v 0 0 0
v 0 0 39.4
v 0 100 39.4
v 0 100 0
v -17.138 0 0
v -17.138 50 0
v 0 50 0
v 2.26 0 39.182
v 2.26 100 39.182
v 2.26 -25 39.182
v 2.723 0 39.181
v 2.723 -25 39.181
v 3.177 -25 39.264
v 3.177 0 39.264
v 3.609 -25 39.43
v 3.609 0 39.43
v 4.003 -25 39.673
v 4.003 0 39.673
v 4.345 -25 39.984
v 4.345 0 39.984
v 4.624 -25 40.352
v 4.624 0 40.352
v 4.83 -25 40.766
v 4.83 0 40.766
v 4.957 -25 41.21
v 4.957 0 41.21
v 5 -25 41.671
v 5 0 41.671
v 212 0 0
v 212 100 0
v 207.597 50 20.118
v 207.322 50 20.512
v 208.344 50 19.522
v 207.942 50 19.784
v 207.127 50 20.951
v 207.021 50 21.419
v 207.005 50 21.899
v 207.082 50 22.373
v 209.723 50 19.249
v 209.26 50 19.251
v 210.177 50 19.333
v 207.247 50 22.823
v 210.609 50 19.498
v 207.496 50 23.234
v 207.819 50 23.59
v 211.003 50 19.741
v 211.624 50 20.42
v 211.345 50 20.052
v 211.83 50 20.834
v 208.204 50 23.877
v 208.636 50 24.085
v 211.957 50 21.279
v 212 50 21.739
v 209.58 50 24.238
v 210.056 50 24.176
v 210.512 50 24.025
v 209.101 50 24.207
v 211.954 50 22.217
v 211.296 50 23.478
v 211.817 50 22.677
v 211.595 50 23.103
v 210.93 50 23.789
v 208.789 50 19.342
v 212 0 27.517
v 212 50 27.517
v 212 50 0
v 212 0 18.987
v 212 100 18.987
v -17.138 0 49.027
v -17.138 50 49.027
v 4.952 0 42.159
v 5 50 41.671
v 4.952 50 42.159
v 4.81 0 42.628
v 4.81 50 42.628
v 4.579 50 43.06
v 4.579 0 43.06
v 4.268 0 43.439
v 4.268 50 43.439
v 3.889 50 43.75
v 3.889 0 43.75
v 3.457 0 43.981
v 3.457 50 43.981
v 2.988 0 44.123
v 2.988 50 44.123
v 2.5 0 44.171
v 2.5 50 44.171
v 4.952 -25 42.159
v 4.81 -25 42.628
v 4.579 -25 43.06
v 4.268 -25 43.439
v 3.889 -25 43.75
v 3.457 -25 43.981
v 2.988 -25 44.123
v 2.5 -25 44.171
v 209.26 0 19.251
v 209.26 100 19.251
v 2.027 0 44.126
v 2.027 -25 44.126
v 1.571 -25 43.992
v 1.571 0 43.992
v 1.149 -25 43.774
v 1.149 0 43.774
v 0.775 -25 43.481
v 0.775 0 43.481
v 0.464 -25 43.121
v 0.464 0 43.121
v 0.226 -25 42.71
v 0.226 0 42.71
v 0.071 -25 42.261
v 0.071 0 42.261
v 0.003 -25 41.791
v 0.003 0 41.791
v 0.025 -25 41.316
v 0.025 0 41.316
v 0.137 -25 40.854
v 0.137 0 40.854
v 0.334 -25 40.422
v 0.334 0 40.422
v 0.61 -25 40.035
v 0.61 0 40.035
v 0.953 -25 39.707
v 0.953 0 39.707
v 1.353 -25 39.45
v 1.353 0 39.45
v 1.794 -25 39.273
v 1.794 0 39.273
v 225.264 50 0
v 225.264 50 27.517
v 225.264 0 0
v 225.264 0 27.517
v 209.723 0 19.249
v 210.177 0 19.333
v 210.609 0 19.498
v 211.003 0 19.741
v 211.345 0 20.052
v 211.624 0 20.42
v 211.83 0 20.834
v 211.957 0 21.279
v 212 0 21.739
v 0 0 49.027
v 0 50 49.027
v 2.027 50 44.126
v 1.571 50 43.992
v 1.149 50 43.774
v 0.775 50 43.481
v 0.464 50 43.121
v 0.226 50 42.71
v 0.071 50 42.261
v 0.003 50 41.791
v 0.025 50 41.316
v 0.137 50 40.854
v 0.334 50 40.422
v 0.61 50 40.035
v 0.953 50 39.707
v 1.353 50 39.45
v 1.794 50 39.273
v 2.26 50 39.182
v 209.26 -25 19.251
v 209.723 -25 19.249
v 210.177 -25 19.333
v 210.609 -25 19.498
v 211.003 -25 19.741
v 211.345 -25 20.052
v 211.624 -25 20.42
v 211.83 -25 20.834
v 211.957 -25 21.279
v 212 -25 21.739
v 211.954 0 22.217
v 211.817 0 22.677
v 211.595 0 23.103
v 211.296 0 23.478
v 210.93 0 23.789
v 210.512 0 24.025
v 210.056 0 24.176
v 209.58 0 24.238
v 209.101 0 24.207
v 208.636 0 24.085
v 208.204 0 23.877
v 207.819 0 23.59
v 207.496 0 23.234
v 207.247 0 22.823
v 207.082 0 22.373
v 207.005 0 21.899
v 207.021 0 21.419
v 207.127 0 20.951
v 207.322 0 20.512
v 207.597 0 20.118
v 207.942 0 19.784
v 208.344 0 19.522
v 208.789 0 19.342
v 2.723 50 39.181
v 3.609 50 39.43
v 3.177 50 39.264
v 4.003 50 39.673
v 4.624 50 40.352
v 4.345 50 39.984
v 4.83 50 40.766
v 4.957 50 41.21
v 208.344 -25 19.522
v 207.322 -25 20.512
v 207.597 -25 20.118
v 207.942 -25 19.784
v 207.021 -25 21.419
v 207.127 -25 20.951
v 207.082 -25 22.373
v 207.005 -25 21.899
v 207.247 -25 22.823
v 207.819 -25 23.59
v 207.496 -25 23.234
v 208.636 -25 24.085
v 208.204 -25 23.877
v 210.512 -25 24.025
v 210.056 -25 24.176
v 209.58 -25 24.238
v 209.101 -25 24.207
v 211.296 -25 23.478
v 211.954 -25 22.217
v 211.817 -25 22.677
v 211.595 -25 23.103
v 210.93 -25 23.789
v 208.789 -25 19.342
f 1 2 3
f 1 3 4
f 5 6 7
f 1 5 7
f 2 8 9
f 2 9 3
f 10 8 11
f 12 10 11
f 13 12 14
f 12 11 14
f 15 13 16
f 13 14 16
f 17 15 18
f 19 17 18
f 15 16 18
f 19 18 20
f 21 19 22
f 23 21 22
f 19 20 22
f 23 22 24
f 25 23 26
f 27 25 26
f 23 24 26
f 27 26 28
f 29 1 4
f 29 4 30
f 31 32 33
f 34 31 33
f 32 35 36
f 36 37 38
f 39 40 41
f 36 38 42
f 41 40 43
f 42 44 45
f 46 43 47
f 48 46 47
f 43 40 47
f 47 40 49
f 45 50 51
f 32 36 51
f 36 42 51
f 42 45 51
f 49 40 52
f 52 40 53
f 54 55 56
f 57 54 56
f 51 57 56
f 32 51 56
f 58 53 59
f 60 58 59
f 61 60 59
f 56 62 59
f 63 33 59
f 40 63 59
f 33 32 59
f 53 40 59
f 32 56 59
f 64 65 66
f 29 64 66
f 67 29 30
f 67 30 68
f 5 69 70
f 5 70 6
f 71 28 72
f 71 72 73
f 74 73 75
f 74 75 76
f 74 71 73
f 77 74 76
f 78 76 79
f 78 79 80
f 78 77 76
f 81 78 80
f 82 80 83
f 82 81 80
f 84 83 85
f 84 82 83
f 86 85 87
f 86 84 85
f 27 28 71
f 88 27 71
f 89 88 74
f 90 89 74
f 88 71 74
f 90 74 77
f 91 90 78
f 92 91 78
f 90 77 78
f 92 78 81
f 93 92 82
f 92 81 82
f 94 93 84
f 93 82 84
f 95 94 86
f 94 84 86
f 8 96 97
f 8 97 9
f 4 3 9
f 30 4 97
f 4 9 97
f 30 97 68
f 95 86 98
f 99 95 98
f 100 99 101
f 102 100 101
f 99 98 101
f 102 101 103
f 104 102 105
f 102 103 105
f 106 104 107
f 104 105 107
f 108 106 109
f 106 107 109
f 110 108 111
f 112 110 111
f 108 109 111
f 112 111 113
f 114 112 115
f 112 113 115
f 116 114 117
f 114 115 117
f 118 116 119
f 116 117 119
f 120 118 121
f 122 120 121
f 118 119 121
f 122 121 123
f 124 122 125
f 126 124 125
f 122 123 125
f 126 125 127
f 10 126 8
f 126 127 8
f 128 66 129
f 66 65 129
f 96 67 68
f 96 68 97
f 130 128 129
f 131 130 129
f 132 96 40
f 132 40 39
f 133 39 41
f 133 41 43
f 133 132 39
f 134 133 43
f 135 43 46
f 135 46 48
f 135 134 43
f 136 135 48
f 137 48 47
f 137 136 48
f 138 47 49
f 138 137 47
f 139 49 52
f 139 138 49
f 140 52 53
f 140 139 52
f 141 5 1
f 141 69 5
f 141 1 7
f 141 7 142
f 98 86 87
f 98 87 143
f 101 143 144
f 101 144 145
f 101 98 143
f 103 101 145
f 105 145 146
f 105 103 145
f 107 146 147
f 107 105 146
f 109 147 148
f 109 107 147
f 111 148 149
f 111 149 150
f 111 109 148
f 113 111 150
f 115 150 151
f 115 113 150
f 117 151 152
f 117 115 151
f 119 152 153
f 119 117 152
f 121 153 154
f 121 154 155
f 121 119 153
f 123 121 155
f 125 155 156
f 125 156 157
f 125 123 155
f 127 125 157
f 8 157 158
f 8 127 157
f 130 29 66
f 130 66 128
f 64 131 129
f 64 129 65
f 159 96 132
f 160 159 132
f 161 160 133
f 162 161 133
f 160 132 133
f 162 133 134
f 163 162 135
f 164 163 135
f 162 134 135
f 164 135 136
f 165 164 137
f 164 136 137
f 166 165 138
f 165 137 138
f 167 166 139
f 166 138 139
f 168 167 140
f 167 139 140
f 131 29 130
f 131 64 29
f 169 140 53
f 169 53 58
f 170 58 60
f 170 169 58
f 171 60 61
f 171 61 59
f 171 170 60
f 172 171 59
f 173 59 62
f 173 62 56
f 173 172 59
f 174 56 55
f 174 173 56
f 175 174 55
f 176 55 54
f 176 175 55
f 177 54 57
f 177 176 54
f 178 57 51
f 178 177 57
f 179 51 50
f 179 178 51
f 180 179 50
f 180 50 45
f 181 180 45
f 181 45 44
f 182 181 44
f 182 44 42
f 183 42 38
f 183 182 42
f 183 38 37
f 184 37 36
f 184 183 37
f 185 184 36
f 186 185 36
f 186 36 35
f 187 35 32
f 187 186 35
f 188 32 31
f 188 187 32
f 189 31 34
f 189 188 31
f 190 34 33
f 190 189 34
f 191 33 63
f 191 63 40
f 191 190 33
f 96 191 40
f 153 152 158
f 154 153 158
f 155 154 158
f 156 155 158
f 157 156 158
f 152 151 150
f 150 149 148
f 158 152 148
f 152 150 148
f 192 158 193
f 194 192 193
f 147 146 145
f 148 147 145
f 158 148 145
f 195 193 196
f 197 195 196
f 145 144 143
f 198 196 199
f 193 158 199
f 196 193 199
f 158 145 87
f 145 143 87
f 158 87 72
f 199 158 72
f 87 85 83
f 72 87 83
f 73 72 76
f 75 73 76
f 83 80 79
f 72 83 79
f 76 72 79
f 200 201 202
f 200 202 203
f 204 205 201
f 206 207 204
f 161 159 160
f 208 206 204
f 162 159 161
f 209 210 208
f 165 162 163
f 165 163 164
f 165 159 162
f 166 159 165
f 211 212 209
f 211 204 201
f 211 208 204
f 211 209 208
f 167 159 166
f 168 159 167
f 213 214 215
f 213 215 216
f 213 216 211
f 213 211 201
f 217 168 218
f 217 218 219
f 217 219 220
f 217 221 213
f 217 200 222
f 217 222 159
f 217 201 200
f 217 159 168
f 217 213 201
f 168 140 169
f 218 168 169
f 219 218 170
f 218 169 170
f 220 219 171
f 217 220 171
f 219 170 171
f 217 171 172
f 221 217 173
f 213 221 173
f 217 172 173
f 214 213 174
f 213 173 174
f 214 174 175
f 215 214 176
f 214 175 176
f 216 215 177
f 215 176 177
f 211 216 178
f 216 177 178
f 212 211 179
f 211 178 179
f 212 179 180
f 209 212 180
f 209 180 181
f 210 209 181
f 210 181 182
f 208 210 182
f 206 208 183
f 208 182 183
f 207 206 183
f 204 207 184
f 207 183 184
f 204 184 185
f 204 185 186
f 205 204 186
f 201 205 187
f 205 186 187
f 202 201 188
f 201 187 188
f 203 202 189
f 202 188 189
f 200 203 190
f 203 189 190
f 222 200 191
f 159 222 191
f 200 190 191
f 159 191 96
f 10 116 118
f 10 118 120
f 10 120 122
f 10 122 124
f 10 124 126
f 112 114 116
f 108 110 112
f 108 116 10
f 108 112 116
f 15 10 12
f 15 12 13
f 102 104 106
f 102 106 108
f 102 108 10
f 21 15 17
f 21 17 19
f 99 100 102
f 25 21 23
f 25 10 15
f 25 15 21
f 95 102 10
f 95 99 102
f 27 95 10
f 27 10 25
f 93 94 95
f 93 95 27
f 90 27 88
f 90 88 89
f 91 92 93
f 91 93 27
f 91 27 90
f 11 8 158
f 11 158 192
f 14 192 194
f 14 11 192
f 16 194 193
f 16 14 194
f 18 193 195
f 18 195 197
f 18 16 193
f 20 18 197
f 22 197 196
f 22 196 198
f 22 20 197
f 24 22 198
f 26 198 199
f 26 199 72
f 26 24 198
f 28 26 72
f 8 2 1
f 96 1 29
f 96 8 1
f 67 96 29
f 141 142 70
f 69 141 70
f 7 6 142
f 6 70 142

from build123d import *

# Parameters (mm, degrees)
F1_DEPTH      = 100
F2_DEPTH      = 25
F2_DEPTH_BACK = 50
F4_DEPTH      = 50


with BuildPart() as f1:
    # F0 (on Front) → F1 (new body)
    with BuildSketch(Plane.XZ):
        Polygon((0, 39.4), (0, 0), (212, 0), (212, 18.9867217821), (209.2603855849, 19.2505166466), (2.2603855436, 39.1823496275), align=None)
    extrude(amount=-F1_DEPTH)


with BuildPart() as f2:
    # F0 (on Front) → F2 (new body, two sides)
    with BuildSketch(Plane.XZ) as f2_sk:
        with BuildLine():
            ThreePointArc((2.5, 44.1708401161), (0.0028790356, 41.7907854751), (2.2603855436, 39.1823496275))
            ThreePointArc((2.2603855436, 39.1823496275), (4.1809169907, 39.820294772), (5, 41.6708401161))
            ThreePointArc((5, 41.6708401161), (4.267766953, 43.4386070691), (2.5, 44.1708401161))
        make_face()
    extrude(amount=F2_DEPTH)
    extrude(f2_sk.sketch, amount=-F2_DEPTH_BACK)


with BuildPart() as f2b:
    # F0 (on Front) → F2, piece 2 (new body, two sides)
    with BuildSketch(Plane.XZ) as f2_2_sk:
        with BuildLine():
            ThreePointArc((212, 21.7390071392), (207.819082994, 23.5895524694), (209.2603855849, 19.2505166466))
            ThreePointArc((209.2603855849, 19.2505166466), (211.180917006, 19.8884618091), (212, 21.7390071392))
        make_face()
    extrude(amount=F2_DEPTH)
    extrude(f2_2_sk.sketch, amount=-F2_DEPTH_BACK)


with BuildPart() as f4:
    # F3 (on face) → F4 (new body)
    with BuildSketch(Plane.XZ):
        Polygon((-17.1377528459, 0), (0, 0), (0, 39.4), (0, 49.0273796022), (-17.1377528459, 49.0273796022), align=None)
    extrude(amount=-F4_DEPTH)


with BuildPart() as f4b:
    # F3 (on face) → F4, piece 2 (new body)
    with BuildSketch(Plane.XZ):
        Polygon((212, 18.9867217821), (212, 0), (225.2641618252, 0), (225.2641618252, 27.517311275), (212, 27.517311275), align=None)
    extrude(amount=-F4_DEPTH)


solid = Compound([f1.part, f2.part, f2b.part, f4.part, f4b.part])
